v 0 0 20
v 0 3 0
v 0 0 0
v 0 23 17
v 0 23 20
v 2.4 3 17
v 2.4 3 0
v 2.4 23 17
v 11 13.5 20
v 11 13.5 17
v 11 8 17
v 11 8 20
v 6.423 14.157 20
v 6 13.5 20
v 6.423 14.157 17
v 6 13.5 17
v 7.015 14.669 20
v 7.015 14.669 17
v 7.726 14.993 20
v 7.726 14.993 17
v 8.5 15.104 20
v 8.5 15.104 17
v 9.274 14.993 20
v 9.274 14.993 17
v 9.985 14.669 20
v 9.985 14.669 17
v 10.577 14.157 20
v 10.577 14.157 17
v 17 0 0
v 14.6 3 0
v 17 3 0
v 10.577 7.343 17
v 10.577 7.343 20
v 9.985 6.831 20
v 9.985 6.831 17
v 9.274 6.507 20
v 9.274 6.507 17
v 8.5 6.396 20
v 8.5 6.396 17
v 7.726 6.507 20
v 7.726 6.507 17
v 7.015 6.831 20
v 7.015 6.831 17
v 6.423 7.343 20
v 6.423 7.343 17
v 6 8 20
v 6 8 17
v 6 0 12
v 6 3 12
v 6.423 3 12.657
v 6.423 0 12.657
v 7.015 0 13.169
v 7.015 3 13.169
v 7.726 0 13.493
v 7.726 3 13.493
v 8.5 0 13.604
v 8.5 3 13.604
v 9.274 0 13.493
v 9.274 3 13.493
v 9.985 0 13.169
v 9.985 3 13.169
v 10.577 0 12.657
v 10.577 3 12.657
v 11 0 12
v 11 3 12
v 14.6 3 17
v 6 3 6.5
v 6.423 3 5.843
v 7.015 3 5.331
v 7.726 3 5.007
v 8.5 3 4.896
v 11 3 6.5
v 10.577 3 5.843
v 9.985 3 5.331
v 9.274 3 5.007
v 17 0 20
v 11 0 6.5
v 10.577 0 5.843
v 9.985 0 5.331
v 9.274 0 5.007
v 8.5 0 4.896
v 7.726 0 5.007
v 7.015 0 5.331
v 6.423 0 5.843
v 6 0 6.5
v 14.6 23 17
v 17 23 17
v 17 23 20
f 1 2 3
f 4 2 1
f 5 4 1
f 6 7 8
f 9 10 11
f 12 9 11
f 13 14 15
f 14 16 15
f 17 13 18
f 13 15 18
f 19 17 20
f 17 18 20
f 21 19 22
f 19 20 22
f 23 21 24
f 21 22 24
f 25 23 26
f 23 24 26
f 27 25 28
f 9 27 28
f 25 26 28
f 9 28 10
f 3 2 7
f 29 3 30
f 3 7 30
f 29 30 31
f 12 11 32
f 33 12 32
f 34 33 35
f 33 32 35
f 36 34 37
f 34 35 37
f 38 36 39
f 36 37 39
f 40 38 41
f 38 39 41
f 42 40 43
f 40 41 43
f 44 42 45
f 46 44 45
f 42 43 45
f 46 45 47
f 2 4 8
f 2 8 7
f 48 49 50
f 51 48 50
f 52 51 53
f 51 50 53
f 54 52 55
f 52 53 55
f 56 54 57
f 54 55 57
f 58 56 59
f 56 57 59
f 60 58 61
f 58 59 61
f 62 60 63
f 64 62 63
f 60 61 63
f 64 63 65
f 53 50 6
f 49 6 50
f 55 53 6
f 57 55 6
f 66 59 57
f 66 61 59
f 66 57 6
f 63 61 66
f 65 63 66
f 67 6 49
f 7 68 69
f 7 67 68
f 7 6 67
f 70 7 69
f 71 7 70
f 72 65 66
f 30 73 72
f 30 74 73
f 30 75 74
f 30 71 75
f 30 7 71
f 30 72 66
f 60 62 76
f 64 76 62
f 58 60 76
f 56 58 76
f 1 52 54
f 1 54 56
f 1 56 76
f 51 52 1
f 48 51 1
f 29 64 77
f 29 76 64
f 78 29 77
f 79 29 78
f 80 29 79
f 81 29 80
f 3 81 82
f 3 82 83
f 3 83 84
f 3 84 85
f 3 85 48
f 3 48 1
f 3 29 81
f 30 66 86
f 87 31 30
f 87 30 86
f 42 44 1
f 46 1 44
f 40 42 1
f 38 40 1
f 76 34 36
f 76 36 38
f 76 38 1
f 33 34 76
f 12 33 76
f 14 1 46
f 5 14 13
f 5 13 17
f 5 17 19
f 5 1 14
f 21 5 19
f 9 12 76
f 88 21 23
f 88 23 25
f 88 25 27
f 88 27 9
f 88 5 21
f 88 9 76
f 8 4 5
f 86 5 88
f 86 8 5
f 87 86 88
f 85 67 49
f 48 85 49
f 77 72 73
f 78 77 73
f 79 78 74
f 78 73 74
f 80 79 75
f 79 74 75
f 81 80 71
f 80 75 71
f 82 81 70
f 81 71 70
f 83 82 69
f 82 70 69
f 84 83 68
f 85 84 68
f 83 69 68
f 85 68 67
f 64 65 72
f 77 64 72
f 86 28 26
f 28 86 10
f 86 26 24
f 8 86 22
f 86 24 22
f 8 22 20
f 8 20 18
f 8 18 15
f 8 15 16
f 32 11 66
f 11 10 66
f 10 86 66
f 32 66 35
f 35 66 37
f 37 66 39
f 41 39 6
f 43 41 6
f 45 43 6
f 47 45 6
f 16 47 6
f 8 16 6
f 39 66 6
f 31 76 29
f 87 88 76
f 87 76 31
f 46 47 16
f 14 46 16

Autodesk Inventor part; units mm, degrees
ref_plane "YZ Plane" through (0, 0, 0) normal (1, 0, 0) x (0, 1, 0)
ref_plane "XZ Plane" through (0, 0, 0) normal (0, 1, 0) x (-1, 0, 0)
ref_plane "XY Plane" through (0, 0, 0) normal (0, 0, 1) x (1, 0, 0)
sketch "Sketch1" plane through (0, 0, 0) normal (0, 0, 1) x (1, 0, 0)
  line L0 (0, 0) -> (0, 3)
  line L1 (0, 3) -> (17, 3)
  line L2 (17, 3) -> (17, 0)
  line L3 (17, 0) -> (0, 0)
  dimension "d0" = 3
  dimension "d1" = 17
extrude "Extrusion1" add sketch "Sketch1" along normal blind 20
sketch "Sketch2" plane through (17, 0, 0) normal (1, 0, 0) x (0, 0, -1)
  point P0 (0, 0)
sketch "Sketch3" plane through (0, 3, 0) normal (0, 1, 0) x (1, 0, 0)
  line L0 (17, -20) -> (17, -17)
  line L1 (17, 0) -> (17, -20) projected
  line L2 (17, -17) -> (0, -17)
  line L3 (0, 0) -> (0, -20) projected
  line L4 (17, -20) -> (0, -20) projected
  line L5 (0, -20) -> (0, -17)
  line L6 (0, -20) -> (17, -20)
  dimension "d4" = 3
extrude "Extrusion2" add sketch "Sketch3" along normal blind 20
sketch "Sketch4" plane through (17, 0, 0) normal (1, 0, 0) x (0, 0, -1)
  line L0 (-20, 23) -> (-17, 23) projected
  line L1 (0, 3) -> (-17, 23)
  line L2 (0, 3) -> (-17, 3) projected
  line L3 (-17, 23) -> (-17, 3)
  line L4 (-17, 3) -> (0, 3)
  point P0 (0, 0)
extrude "Extrusion3" add sketch "Sketch4" against normal blind 2.4
sketch "Sketch5" plane through (0, 0, 0) normal (-1, 0, 0) x (0, 0, 1)
  line L0 (17, 3) -> (17, 23) projected
  line L1 (0, 3) -> (0, 0) projected
  line L2 (17, 23) -> (0, 3)
  line L3 (0, 3) -> (17, 3)
  line L4 (17, 23) -> (0, 3) projected
  line L5 (17, 3) -> (17, 23)
extrude "Extrusion4" add sketch "Sketch5" against normal blind 2.4
sketch "Sketch6" plane through (14.6, 3, 17) normal (0, 0, -1) x (-1, 0, 0)
  line L0 (-2.4, -3) -> (-2.4, 20) projected
  line L1 (-2.4, -3) -> (6.1, -3)
  line L2 (14.6, -3) -> (-2.4, -3) projected
  line L3 (6.1, 5) -> (6.7519, 5)
  line L4 (6.7519, 10.5) -> (6.1, 10.5)
  line L5 (6.1, 10.5) -> (3.6, 10.5)
  line L6 (3.6, 10.5) -> (8.6, 10.5)
  line L7 (6.1, 5) -> (3.6, 5)
  line L8 (3.6, 5) -> (8.6, 5)
  line L9 (8.6, 5) -> (8.6, 10.5)
  line L10 (3.6, 10.5) -> (3.6, 5)
  arc A0 (8.6, 10.5) -> (3.6, 10.5) centre (6.1, 9.3544) ccw
  arc A1 (3.6, 5) -> (8.6, 5) centre (6.1, 6.1456) ccw
  dimension "d11" = 8.5
extrude "Extrusion5" cut sketch "Sketch6" against normal through all
sketch "Sketch7" plane through (2.4, 3, 17) normal (0, 1, 0) x (1, 0, 0)
  line L0 (-2.4, -3) -> (-2.4, 20)
  line L1 (-2.4, -3) -> (6.1, -3)
  line L2 (14.6, -3) -> (-2.4, -3)
  line L3 (6.1, 5) -> (6.7519, 5)
  line L4 (6.7519, 10.5) -> (6.1, 10.5)
  line L5 (6.1, 10.5) -> (3.6, 10.5)
  line L6 (3.6, 10.5) -> (8.6, 10.5)
  line L7 (6.1, 5) -> (3.6, 5)
  line L8 (3.6, 5) -> (8.6, 5)
  line L9 (8.6, 5) -> (8.6, 10.5)
  line L10 (3.6, 10.5) -> (3.6, 5)
  arc A0 (8.6, 10.5) -> (3.6, 10.5) centre (6.1, 9.3544) ccw
  arc A1 (3.6, 5) -> (8.6, 5) centre (6.1, 6.1456) ccw
  dimension "d25" = 8.5
extrude "Extrusion6" cut sketch "Sketch7" against normal through all
properties part number "90 Degree attachment T Slot"
